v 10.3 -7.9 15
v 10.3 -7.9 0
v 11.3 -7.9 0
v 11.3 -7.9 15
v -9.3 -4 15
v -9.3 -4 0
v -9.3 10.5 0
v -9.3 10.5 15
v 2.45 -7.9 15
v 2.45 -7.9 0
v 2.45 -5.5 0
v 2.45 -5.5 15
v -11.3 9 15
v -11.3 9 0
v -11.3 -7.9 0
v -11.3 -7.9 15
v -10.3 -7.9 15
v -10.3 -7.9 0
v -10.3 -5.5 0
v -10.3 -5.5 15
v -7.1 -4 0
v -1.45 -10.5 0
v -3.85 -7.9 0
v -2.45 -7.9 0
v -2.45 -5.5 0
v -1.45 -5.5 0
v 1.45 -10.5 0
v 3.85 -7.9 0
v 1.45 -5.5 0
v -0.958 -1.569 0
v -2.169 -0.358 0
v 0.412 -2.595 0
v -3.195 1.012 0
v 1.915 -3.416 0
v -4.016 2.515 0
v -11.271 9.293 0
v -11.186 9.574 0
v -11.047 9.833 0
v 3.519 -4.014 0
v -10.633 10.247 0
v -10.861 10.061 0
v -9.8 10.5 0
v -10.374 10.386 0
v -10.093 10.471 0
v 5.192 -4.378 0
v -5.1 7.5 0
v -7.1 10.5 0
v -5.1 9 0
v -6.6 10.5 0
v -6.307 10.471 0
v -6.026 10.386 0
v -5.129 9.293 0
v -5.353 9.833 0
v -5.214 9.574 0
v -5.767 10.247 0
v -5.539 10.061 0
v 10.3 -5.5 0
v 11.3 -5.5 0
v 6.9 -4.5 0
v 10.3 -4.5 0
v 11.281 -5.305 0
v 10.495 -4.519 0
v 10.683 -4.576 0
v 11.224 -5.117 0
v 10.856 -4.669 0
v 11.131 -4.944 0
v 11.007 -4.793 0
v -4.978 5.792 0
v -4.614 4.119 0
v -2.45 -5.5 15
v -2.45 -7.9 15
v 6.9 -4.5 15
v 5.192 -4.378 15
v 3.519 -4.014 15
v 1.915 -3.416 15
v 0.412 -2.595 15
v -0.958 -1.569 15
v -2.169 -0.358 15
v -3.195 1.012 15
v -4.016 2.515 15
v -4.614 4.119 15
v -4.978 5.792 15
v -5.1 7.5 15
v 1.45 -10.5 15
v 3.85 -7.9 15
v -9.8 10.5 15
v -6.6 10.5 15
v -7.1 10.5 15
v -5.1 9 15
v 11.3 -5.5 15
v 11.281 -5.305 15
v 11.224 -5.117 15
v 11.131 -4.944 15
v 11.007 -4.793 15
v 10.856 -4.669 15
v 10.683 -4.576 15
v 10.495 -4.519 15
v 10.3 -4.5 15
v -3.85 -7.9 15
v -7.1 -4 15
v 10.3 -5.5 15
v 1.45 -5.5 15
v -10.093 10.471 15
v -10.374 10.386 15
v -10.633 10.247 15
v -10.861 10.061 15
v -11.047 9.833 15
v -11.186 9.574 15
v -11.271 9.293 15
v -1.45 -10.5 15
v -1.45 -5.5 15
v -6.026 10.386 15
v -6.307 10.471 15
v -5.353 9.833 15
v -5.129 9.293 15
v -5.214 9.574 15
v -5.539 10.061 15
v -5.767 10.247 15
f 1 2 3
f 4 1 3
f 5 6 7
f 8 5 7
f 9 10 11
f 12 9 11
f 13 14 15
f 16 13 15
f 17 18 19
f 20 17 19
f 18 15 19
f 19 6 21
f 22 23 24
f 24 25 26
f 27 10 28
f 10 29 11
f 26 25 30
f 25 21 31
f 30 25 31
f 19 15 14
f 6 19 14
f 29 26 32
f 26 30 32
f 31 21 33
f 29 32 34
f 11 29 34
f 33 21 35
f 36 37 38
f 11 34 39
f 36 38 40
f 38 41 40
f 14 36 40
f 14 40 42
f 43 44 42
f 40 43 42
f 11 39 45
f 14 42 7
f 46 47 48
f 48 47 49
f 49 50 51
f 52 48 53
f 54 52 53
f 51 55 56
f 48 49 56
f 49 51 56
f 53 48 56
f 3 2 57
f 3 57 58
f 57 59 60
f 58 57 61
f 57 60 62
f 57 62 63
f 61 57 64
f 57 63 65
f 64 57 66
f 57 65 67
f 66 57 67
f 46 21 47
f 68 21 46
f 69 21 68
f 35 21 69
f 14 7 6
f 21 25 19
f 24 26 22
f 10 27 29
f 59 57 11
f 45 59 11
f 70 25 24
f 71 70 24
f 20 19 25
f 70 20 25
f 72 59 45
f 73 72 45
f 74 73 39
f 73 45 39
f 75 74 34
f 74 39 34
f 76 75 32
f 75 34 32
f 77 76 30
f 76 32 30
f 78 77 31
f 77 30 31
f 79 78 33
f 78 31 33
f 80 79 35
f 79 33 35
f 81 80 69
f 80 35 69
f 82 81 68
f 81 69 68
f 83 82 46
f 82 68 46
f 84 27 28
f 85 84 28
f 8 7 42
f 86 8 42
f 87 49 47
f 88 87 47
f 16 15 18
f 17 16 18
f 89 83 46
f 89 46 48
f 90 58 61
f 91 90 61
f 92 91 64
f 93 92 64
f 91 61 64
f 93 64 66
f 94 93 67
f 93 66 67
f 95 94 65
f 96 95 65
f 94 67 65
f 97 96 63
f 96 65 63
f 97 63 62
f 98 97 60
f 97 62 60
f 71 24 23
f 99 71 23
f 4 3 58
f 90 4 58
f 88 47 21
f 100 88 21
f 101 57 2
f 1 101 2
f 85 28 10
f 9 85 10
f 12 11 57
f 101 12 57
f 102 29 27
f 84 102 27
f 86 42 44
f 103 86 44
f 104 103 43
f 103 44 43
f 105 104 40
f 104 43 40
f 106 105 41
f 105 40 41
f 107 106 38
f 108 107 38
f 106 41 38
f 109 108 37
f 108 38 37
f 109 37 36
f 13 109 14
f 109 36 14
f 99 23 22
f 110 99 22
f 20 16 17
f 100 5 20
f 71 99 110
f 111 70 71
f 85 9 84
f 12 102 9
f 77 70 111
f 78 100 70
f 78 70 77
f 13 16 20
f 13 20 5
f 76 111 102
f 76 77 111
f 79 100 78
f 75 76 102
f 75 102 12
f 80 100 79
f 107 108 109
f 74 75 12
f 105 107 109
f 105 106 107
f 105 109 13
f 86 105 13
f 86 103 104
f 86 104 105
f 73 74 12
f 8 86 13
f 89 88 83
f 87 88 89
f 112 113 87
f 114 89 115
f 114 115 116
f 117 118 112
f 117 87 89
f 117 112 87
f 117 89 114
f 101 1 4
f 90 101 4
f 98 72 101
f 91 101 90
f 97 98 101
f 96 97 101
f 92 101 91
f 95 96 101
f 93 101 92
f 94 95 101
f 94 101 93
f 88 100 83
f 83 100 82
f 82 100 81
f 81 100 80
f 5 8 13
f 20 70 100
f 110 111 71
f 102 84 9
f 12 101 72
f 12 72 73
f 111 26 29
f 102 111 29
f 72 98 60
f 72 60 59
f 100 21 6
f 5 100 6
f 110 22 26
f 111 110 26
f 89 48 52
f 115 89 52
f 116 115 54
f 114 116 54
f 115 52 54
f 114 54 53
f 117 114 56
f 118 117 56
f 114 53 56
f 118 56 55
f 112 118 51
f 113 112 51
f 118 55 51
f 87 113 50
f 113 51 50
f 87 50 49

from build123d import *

# Parameters (mm, degrees)
F0_W     = 1
F0_H     = 2.4
F1_DEPTH = 15


# Not quite as in the source:
# - a feature names something its author has since deleted; it is built from what else it names


with BuildPart() as f1:
    # F0 (on Top) → F1 (new body)
    with BuildSketch(Plane.XY):
        with Locations((10.8, -6.7)):
            Rectangle(F0_W, F0_H)
        with Locations((-10.8, -6.7)):
            Rectangle(F0_W, F0_H)
        Polygon((-2.45, -8.5), (-2.45, -7.9), (-3.85, -7.9), (-1.45, -10.5), (-1.45, -8.5), align=None)
        with BuildLine():
            Line((10.3, -4.5), (10.3, -5.5))
            Line((10.3, -5.5), (11.3, -5.5))
            ThreePointArc((11.3, -5.5), (11.0071067812, -4.7928932188), (10.3, -4.5))
        make_face()
        Polygon((-1.45, -5.5), (-2.45, -5.5), (-2.45, -7.9), (-2.45, -8.5), (-1.45, -8.5), align=None)
        Polygon((2.45, -5.5), (1.45, -5.5), (1.45, -8.5), (2.45, -8.5), (2.45, -7.9), align=None)
        with BuildLine():
            Line((-11.3, -5.5), (-10.3, -5.5))
            Line((-10.3, -5.5), (-2.45, -5.5))
            Line((-2.45, -5.5), (-1.45, -5.5))
            Line((-1.45, -5.5), (1.45, -5.5))
            Line((1.45, -5.5), (2.45, -5.5))
            Line((2.45, -5.5), (10.3, -5.5))
            Line((10.3, -5.5), (10.3, -4.5))
            Line((10.3, -4.5), (6.9, -4.5))
            ThreePointArc((6.9, -4.5), (-1.5852813742, -0.9852813742), (-5.1, 7.5))
            Line((-5.1, 7.5), (-5.1, 9))
            ThreePointArc((-5.1, 9), (-5.5393398282, 10.0606601718), (-6.6, 10.5))
            Line((-6.6, 10.5), (-7.1, 10.5))
            Line((-7.1, 10.5), (-7.1, -4))
            Line((-7.1, -4), (-9.3, -4))
            Line((-9.3, -4), (-9.3, 10.5))
            Line((-9.3, 10.5), (-9.8, 10.5))
            ThreePointArc((-9.8, 10.5), (-10.8606601718, 10.0606601718), (-11.3, 9))
            Line((-11.3, 9), (-11.3, -5.5))
        make_face()
        Polygon((2.45, -8.5), (1.45, -8.5), (1.45, -10.5), (3.85, -7.9), (2.45, -7.9), align=None)
    extrude(amount=F1_DEPTH)


solid = f1.part
